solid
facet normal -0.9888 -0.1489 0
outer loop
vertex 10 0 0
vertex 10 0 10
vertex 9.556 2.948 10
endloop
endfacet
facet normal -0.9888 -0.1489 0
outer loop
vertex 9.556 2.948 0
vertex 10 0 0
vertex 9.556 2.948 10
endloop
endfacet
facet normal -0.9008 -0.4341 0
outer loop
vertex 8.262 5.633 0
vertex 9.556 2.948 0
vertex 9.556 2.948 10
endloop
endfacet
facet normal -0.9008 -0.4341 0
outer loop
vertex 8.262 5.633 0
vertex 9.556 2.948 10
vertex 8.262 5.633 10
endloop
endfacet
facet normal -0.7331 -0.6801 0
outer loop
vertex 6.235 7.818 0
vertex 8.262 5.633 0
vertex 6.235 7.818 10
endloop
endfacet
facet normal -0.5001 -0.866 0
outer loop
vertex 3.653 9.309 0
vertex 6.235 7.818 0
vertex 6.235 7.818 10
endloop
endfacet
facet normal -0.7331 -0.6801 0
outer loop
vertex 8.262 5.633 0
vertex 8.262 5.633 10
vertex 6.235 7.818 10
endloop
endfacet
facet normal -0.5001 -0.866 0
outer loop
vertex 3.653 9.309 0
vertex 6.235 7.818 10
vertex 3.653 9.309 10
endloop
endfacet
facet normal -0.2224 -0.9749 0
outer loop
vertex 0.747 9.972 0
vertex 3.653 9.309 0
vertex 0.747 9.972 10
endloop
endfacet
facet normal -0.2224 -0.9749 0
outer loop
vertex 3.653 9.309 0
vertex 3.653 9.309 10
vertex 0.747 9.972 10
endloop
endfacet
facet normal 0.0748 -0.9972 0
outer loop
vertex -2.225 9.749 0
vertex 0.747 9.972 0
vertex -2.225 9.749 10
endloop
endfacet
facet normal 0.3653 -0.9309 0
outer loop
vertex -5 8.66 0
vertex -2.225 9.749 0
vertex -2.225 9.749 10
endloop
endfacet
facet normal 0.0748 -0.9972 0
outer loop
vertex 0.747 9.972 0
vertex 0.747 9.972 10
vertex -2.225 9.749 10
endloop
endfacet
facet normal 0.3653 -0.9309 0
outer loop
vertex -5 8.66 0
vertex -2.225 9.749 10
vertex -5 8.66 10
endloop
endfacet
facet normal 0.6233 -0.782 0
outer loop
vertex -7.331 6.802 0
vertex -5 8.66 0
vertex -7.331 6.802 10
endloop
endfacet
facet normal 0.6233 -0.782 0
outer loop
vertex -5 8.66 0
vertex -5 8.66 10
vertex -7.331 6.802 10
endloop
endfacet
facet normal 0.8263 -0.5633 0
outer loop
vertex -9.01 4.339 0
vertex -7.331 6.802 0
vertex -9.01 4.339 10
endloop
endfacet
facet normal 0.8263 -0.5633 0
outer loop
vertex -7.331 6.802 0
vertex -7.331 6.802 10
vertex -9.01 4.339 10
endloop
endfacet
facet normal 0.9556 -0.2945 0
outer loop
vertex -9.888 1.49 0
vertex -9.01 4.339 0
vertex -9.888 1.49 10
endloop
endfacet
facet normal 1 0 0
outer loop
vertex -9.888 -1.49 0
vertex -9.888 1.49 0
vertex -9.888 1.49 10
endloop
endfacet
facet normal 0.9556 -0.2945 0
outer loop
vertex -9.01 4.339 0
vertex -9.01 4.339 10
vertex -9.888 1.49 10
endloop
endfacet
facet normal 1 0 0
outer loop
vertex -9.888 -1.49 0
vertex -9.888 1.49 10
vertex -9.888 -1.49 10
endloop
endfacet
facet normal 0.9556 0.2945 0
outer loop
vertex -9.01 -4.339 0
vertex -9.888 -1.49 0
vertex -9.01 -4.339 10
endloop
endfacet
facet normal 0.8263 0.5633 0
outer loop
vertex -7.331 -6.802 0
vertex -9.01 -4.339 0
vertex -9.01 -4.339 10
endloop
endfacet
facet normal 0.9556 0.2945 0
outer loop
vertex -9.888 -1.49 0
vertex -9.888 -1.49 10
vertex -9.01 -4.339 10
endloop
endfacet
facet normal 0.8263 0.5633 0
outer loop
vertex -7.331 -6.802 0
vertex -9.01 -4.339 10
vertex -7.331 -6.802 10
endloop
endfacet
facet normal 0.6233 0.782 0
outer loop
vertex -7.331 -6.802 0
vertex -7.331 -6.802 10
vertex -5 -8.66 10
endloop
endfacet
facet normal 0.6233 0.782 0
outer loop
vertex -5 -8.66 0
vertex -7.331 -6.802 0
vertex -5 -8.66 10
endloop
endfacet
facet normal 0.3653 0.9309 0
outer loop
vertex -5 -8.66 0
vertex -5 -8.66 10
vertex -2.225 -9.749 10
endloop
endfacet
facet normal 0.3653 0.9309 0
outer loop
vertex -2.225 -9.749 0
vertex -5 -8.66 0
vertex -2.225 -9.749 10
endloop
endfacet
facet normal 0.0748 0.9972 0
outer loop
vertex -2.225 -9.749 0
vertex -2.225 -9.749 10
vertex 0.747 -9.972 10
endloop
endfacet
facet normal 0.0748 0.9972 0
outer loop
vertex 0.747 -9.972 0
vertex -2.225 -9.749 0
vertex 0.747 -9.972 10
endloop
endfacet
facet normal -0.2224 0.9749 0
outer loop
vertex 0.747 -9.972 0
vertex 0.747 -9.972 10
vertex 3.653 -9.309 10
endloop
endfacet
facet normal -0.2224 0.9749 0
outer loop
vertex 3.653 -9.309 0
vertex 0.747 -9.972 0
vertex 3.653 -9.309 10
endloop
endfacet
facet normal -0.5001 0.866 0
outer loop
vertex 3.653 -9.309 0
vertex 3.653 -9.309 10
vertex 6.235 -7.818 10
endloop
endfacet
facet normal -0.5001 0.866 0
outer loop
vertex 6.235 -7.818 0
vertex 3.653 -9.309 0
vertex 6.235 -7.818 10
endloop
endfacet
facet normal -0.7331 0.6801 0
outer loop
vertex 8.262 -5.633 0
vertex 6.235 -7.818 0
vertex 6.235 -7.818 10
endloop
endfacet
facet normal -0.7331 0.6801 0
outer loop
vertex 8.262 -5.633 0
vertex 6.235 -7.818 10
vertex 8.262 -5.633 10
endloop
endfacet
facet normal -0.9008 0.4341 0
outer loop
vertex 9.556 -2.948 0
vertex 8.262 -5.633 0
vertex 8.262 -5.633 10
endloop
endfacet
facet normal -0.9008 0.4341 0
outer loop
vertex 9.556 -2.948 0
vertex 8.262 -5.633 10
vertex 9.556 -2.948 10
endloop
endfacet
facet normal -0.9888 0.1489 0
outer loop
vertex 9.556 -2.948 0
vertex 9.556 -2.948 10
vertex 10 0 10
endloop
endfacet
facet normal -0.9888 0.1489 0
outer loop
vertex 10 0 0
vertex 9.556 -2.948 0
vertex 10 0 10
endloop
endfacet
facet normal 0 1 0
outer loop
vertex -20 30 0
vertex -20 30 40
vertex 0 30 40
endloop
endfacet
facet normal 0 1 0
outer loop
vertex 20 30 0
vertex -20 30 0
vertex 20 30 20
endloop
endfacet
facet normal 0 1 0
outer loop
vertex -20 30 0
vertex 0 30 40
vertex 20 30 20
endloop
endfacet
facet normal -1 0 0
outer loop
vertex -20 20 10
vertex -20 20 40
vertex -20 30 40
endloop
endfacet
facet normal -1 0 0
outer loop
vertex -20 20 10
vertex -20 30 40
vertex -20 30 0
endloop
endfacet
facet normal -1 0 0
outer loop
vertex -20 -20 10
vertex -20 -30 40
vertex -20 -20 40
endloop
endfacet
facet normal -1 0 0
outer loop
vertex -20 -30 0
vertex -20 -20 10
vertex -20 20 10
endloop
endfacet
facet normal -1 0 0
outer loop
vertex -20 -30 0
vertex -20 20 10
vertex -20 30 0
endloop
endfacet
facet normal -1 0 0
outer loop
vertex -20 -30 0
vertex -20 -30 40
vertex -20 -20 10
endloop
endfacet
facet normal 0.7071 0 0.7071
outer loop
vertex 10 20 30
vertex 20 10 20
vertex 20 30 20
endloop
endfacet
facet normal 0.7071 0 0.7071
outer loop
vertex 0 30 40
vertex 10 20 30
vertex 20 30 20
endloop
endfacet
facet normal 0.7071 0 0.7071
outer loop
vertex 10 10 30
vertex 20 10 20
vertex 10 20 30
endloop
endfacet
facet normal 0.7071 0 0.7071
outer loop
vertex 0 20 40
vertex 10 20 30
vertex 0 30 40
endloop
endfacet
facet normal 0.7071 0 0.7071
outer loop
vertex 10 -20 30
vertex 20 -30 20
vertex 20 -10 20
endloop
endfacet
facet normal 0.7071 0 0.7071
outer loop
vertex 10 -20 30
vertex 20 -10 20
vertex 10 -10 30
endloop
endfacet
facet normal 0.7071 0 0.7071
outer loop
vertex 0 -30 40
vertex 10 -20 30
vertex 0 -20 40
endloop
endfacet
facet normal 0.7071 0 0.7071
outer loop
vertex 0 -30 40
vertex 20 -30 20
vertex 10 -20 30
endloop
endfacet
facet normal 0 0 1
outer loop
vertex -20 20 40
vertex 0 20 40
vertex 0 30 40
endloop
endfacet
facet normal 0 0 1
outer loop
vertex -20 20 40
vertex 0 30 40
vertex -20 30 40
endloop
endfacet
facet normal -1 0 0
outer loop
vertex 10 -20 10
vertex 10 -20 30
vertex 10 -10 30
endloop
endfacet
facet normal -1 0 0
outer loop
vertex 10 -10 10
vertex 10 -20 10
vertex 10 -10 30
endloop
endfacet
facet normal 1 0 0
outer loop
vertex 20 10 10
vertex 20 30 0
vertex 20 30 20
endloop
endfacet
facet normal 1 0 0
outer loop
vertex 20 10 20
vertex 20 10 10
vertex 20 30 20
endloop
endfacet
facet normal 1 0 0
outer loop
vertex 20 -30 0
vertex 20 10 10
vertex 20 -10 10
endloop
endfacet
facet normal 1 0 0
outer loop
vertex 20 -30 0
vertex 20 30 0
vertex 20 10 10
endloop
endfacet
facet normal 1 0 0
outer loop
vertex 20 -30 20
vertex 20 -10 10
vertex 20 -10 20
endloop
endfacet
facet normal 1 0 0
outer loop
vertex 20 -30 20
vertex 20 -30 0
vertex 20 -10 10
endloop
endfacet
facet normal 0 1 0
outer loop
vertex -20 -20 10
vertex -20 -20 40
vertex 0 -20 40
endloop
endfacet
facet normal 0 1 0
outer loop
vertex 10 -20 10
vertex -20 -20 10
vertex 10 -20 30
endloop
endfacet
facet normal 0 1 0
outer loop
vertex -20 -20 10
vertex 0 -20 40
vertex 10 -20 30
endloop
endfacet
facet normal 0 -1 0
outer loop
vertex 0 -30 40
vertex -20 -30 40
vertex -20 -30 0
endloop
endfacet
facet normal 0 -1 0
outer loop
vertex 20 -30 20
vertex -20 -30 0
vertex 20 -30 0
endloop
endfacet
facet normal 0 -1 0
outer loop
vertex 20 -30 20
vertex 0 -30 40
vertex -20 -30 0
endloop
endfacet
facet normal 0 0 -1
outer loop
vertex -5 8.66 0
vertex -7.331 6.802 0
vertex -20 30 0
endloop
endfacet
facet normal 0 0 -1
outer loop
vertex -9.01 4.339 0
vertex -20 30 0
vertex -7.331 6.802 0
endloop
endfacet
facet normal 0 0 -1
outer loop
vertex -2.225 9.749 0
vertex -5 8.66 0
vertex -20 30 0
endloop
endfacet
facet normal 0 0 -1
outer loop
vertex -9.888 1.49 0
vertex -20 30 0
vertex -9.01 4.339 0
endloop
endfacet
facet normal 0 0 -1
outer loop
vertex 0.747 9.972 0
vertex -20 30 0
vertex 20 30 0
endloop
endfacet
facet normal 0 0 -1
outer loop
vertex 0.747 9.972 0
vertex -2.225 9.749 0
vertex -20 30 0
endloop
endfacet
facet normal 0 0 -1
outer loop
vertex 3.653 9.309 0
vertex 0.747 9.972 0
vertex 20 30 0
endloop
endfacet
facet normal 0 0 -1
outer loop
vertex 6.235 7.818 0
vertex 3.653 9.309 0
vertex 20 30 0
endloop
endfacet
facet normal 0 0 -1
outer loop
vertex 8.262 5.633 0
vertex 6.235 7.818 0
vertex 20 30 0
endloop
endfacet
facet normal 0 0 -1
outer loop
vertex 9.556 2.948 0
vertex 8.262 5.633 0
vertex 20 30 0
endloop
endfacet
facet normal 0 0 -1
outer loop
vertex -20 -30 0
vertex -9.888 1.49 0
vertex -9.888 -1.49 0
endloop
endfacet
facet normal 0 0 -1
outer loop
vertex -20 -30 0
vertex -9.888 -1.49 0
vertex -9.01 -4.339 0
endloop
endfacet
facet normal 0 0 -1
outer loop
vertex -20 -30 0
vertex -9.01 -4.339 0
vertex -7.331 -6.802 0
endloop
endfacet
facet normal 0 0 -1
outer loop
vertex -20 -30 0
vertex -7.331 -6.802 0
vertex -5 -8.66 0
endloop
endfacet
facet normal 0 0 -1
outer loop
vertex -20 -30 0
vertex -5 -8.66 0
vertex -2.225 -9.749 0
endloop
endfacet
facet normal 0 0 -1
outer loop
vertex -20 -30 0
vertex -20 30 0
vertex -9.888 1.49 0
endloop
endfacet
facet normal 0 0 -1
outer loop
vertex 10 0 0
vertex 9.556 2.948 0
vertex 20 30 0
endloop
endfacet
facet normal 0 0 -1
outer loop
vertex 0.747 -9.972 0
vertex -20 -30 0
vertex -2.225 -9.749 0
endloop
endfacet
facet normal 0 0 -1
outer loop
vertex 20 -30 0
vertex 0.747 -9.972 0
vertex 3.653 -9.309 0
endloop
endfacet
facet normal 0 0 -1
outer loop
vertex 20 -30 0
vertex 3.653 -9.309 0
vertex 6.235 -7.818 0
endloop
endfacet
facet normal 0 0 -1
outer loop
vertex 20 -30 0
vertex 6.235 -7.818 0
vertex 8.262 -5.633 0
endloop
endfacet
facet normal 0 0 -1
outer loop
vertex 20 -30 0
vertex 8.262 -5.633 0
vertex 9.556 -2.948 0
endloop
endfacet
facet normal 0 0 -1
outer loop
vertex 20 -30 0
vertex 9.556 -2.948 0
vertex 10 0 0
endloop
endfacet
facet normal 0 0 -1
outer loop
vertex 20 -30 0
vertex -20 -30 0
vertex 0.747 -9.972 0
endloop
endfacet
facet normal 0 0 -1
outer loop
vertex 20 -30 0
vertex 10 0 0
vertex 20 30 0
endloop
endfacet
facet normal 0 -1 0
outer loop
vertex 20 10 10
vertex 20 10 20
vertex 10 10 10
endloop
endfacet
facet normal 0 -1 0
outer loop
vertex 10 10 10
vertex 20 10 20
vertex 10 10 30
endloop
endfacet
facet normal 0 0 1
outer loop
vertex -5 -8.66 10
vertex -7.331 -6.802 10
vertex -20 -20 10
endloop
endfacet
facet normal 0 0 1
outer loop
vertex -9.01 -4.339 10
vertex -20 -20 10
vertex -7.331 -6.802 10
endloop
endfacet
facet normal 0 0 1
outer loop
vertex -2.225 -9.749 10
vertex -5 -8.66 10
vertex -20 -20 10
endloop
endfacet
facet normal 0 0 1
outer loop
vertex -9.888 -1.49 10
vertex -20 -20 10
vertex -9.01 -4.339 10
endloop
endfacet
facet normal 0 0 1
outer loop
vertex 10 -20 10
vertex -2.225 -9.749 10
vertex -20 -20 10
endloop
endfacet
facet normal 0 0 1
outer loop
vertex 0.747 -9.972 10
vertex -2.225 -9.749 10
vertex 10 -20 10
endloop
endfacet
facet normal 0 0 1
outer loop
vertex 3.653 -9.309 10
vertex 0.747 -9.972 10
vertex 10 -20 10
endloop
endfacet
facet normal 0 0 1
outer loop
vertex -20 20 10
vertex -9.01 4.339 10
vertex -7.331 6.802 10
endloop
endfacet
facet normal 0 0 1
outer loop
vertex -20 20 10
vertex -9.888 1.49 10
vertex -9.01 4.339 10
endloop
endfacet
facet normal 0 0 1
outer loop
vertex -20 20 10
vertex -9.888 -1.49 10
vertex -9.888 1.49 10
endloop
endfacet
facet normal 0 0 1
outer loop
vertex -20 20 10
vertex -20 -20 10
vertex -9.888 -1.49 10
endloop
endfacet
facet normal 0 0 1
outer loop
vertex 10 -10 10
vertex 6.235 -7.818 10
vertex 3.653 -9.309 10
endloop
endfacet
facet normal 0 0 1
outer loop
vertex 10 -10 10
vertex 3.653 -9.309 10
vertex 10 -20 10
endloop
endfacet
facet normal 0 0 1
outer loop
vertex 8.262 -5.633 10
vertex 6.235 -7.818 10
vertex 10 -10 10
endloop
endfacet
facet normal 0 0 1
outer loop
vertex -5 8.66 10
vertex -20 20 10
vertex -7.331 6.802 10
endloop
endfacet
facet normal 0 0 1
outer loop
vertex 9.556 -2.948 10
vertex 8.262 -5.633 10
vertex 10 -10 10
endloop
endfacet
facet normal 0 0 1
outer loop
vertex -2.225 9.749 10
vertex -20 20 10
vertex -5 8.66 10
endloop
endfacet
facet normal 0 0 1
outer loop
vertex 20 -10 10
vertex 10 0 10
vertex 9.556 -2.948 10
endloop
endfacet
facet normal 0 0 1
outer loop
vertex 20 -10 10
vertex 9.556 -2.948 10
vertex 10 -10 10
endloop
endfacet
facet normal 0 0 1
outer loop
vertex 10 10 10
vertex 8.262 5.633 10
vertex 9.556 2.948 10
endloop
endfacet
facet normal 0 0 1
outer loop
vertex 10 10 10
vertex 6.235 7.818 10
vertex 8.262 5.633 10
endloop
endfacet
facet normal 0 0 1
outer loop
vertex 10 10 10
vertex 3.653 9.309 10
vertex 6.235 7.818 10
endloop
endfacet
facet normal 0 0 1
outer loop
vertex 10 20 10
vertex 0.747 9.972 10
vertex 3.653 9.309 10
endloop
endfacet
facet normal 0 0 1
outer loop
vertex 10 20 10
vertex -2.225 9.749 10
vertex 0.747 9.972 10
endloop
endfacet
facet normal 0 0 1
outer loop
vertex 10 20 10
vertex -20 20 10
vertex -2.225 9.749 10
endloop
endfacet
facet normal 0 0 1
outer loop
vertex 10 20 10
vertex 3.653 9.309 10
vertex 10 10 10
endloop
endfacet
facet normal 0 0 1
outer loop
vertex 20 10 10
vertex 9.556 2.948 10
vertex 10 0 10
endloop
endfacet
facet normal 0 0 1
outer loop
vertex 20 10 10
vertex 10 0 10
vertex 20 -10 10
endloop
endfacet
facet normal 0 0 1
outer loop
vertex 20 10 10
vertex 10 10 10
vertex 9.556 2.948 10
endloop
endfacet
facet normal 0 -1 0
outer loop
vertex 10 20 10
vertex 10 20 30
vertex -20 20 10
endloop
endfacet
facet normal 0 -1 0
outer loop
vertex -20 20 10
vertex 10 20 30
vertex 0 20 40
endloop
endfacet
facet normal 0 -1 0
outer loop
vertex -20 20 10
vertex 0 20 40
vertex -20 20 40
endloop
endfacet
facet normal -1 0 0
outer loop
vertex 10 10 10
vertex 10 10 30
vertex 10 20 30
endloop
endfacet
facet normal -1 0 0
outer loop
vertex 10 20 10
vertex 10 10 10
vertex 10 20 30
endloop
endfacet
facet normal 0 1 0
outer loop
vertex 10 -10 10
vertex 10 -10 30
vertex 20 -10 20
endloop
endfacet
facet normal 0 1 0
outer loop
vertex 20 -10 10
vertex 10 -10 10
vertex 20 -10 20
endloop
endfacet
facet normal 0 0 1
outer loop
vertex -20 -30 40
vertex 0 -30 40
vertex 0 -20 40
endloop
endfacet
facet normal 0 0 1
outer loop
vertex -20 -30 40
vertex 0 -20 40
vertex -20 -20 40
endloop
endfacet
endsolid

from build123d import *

# Parameters (mm, degrees)
F1_DEPTH = 30
F3_DEPTH = 30
F4_R     = 10
F5_DEPTH = 25


with BuildPart() as f1:
    # F0 (on Front) → F1 (new body, symmetric)
    with BuildSketch(Plane.XZ):
        Polygon((0, 40), (-20, 40), (-20, 0), (20, 0), (20, 20), align=None)
    extrude(amount=F1_DEPTH, both=True)

    # F2 (on face) → F3 (cut)
    with BuildSketch(Plane.XY.offset(40)):
        Polygon((10, 20), (-20, 20), (-20, -20), (10, -20), (10, -10), (20, -10), (20, 10), (10, 10), align=None)
    extrude(amount=-F3_DEPTH, mode=Mode.SUBTRACT)

    # F4 (on face) → F5 (cut)
    with BuildSketch(Plane.XY.offset(10)):
        Circle(F4_R)
    extrude(amount=-F5_DEPTH, mode=Mode.SUBTRACT)


solid = f1.part
